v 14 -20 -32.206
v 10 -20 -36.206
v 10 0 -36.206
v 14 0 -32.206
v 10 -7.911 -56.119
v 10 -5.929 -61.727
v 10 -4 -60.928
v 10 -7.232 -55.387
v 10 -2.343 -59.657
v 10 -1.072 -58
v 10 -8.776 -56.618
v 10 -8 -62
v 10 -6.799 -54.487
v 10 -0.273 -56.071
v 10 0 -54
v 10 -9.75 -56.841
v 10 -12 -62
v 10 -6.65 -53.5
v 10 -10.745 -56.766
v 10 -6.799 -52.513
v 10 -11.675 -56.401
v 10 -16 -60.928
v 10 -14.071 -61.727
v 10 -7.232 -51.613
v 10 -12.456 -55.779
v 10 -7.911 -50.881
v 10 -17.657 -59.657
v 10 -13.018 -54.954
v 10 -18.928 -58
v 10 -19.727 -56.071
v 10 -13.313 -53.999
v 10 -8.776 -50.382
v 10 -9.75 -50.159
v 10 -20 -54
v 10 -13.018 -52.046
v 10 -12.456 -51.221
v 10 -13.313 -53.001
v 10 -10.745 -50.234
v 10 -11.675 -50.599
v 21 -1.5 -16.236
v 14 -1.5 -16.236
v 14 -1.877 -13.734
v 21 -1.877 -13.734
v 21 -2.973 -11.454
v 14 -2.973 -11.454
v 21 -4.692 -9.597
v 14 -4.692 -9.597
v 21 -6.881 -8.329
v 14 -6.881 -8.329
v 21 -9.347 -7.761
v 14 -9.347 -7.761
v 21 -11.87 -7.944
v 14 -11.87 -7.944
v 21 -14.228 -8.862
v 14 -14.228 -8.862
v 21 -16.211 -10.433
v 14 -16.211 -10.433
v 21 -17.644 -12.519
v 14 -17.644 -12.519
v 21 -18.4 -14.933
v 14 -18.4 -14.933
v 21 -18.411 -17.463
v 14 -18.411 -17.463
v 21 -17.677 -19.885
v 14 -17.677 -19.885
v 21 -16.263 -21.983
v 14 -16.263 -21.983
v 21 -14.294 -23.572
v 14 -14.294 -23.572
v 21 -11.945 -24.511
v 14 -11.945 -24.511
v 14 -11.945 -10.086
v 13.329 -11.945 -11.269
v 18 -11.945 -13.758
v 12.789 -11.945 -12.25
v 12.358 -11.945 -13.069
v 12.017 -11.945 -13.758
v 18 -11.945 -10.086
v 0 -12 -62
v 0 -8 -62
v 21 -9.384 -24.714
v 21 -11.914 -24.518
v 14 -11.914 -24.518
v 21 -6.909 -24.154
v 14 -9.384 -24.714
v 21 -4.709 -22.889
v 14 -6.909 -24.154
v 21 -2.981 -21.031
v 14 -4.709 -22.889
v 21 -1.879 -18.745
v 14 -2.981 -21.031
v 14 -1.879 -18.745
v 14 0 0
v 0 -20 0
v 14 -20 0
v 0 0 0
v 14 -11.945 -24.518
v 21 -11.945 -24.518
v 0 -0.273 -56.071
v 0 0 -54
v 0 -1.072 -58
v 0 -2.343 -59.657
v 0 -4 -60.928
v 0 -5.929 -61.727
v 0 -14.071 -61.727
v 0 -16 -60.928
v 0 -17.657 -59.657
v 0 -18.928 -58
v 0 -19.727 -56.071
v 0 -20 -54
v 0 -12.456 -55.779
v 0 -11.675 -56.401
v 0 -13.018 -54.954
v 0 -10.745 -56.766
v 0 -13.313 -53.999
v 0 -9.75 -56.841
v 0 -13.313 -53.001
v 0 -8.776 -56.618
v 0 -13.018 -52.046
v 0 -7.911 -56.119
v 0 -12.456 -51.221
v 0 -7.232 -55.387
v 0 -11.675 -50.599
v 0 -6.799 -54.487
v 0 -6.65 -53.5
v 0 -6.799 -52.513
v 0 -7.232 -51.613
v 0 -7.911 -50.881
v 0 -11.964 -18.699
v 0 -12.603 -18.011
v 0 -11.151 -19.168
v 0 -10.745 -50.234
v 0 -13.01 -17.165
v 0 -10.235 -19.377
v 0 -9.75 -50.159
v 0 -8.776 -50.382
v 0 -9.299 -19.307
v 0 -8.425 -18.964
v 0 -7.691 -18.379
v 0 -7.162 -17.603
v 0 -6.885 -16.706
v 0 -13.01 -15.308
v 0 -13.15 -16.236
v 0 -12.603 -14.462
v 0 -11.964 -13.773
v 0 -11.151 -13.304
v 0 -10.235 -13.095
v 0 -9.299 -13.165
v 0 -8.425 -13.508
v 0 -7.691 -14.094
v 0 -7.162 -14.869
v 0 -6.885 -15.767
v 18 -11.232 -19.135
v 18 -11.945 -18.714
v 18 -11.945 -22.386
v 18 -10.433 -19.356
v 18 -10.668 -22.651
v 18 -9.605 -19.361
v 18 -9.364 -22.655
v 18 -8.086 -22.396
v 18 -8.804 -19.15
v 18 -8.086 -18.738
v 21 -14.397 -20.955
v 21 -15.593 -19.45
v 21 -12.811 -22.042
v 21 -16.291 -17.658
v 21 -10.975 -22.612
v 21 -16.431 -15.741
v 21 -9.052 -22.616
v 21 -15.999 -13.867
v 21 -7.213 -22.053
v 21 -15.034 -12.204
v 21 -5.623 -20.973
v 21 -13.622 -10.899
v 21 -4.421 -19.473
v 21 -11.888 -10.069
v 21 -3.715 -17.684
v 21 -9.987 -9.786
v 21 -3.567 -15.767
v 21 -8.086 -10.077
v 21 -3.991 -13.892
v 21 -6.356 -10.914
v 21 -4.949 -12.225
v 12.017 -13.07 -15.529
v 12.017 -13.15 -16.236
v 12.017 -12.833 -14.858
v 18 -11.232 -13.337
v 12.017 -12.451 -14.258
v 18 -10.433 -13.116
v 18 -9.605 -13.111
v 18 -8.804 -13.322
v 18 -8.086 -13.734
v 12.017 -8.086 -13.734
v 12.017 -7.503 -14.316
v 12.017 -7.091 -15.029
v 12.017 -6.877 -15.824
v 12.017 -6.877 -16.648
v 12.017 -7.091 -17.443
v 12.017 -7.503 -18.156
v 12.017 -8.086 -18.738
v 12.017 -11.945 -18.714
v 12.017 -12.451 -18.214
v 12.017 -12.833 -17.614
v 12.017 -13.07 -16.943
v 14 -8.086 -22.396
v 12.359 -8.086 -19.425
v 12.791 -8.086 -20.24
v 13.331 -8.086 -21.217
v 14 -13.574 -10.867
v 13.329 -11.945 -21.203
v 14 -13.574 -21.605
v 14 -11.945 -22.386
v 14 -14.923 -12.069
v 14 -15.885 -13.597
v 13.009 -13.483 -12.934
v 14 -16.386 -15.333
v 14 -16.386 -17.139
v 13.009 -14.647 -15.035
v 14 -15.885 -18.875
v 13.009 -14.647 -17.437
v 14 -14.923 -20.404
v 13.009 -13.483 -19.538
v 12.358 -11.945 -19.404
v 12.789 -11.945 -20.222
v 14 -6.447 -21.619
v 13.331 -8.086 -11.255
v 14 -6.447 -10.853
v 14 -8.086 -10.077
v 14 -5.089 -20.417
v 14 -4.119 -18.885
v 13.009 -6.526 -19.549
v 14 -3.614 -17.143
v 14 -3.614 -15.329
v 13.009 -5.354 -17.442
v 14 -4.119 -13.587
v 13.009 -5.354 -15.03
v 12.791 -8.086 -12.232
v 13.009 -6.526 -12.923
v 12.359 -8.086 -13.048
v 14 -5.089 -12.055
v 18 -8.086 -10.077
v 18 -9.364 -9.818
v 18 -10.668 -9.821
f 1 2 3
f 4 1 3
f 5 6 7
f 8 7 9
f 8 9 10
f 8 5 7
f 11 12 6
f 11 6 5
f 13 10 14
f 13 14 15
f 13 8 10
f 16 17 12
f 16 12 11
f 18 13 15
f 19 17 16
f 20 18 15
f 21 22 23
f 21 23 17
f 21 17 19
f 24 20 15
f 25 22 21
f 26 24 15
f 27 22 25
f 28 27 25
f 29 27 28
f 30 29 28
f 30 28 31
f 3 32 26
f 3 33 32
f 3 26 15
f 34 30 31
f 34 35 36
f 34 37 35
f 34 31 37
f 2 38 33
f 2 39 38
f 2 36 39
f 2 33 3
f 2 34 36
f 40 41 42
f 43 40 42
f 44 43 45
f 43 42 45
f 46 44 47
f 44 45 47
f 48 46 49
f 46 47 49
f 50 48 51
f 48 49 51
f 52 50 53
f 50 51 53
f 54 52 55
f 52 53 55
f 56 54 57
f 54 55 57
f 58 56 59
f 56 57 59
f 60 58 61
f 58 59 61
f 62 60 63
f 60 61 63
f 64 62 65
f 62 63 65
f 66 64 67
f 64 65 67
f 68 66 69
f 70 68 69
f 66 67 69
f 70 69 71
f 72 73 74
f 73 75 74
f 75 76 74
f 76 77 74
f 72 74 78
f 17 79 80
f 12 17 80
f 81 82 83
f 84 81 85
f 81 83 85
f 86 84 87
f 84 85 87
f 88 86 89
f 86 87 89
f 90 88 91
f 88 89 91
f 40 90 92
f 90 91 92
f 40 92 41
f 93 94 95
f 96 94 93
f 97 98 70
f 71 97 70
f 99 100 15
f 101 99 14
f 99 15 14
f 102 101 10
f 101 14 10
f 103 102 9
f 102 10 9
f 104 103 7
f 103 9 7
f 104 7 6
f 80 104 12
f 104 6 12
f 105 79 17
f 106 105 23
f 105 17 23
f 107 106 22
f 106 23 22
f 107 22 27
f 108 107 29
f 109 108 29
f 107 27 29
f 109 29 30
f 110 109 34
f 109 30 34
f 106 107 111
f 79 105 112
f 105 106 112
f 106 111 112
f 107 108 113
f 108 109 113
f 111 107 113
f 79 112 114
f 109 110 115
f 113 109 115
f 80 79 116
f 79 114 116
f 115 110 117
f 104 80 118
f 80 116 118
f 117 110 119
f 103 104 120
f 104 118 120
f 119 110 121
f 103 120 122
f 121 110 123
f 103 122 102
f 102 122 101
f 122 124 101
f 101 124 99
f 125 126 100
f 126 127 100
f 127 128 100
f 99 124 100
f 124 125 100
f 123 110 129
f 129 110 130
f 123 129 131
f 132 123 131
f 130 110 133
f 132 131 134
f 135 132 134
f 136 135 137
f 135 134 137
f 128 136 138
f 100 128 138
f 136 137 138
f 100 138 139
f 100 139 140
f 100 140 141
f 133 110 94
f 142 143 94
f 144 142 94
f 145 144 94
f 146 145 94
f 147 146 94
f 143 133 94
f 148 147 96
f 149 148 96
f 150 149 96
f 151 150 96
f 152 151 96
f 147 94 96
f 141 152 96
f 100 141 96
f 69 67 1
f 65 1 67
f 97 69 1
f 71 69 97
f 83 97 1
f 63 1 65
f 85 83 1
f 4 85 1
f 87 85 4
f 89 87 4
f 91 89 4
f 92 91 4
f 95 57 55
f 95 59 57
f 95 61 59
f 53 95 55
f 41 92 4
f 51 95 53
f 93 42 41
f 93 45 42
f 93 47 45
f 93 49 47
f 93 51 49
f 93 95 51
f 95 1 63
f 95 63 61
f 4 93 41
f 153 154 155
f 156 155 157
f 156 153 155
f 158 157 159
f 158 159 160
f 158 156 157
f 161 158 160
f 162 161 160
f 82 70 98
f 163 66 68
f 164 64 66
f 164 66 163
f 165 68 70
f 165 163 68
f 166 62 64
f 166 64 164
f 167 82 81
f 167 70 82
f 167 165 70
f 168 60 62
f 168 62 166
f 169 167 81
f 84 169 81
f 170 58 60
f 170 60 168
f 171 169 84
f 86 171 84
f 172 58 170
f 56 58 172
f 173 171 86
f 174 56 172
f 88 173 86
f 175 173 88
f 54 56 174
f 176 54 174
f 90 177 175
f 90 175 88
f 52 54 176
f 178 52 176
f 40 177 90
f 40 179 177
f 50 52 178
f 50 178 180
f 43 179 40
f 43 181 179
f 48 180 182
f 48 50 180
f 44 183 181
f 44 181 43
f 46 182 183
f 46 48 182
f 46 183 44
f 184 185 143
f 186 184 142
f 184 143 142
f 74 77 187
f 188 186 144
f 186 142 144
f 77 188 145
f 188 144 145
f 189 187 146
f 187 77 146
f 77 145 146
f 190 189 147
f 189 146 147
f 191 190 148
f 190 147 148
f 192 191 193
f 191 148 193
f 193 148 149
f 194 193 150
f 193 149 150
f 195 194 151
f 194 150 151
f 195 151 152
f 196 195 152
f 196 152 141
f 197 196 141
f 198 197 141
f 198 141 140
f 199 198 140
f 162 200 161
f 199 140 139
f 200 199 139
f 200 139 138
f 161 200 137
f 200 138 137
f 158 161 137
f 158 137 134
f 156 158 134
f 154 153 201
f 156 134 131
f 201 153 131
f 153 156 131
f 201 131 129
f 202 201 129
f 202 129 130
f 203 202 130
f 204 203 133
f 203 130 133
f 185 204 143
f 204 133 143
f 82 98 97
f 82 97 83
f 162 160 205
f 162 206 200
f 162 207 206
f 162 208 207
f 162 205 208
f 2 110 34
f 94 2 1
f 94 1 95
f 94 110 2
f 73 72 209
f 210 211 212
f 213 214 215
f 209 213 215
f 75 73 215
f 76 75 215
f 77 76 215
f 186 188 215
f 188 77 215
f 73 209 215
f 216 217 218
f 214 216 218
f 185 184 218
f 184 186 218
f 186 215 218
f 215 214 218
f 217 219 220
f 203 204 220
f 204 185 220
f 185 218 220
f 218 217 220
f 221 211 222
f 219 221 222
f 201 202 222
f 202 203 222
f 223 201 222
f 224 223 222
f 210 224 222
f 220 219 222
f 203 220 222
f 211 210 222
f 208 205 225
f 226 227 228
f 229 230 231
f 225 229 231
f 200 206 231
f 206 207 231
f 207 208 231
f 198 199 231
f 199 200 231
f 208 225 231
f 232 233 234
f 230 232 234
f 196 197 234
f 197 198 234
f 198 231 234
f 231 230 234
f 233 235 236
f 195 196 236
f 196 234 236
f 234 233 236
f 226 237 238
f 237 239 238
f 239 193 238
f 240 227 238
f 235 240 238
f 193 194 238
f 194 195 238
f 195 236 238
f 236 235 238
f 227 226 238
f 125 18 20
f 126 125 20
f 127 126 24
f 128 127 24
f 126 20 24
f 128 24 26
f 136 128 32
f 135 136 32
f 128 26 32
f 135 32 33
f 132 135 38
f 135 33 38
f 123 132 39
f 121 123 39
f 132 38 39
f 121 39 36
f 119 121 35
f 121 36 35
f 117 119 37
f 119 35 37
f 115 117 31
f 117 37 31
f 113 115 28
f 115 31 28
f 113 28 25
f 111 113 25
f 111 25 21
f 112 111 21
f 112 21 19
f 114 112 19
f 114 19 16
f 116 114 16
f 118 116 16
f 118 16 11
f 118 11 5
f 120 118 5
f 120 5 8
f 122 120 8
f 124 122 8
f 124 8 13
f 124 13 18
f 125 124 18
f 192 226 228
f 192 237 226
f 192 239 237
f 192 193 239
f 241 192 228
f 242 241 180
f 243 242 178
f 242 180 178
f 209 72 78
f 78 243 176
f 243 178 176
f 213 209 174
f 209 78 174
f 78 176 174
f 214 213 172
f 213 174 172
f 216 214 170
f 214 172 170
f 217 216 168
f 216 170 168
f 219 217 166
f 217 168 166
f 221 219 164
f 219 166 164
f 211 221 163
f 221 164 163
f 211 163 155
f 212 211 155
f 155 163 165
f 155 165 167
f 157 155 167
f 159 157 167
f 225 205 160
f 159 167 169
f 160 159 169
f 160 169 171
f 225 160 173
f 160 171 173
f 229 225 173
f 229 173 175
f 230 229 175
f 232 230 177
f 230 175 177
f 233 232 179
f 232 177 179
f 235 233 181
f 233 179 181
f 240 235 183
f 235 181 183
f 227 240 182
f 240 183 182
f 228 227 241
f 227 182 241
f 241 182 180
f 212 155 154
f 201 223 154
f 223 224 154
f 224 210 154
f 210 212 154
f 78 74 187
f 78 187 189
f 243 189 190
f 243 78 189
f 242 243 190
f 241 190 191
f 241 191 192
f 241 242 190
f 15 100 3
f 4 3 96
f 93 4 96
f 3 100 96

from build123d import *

# Parameters (mm, degrees)
F0_W      = 20
F0_H      = 62
F1_DEPTH  = 14
F2_R      = 8.5
F3_DEPTH  = 7
F5_D      = 12.9
F5_DEPTH  = 7
F5_TIP    = 3.8755509927
F6_W      = 3.8587664786
F6_H      = 16.5562349188
F7_DEPTH  = 11.59683
F9_D      = 6.3
F10_R     = 6.45
F11_DEPTH = 3
F12_R     = 8
F13_R     = 8
F14_W     = 4
F14_H     = 37.0940975845
F15_DEPTH = 25
F17_D     = 6.7
F18_SIZE  = 3.99999


# Not quite as in the source:
# - a fillet or chamfer is up to 0.001 mm smaller than in the source, because OpenCascade refuses the exact size


with BuildPart() as f1:
    # F0 (on Right) → F1 (new body)
    with BuildSketch(Plane.YZ):
        with Locations((-10, -31)):
            Rectangle(F0_W, F0_H)
    extrude(amount=F1_DEPTH)

    # F2 (on face) → F3 (join)
    with BuildSketch(Plane.YZ.offset(14)):
        with Locations((-10, -16.2361655384)):
            Circle(F2_R)
    extrude(amount=F3_DEPTH)

    # F5
    with Locations(Plane.YZ.offset(21)):
        with Locations((-10, -16.2361655384)):
            Hole(F5_D / 2, depth=F5_DEPTH)
            with Locations((0, 0, -(F5_DEPTH + F5_TIP / 2))):  # 118° drill point
                Cone(0, F5_D / 2, F5_TIP, mode=Mode.SUBTRACT)

    # F6 (on face) → F7 (join)
    with BuildSketch(Plane.YZ.offset(21)):
        with Locations((-10.015449224, -16.2397662935)):
            Rectangle(F6_W, F6_H)
    extrude(amount=-F7_DEPTH)

    # F9 (through all)
    with Locations(Plane.YZ.offset(21)):
        with Locations((-10, -16.2361655384)):
            Hole(F9_D / 2)

    # F10 (on face) → F11 (cut)
    with BuildSketch(Plane.YZ.offset(21)):
        with Locations((-10, -16.2361655384)):
            Circle(F10_R)
    extrude(amount=-F11_DEPTH, mode=Mode.SUBTRACT)

    # F12
    f12_edges = [f1.edges().sort_by_distance(p)[0] for p in [
        (7, 0, -62),
    ]]
    fillet(f12_edges, radius=F12_R)

    # F13
    f13_edges = [f1.edges().sort_by_distance(p)[0] for p in [
        (7, -20, -62),
    ]]
    fillet(f13_edges, radius=F13_R)

    # F14 (on face) → F15 (cut)
    with BuildSketch(Plane.XZ.offset(20)):
        with Locations((12, -50.7526341826)):
            Rectangle(F14_W, F14_H)
    extrude(amount=-F15_DEPTH, mode=Mode.SUBTRACT)

    # F17 (through all)
    with Locations(Plane(origin=(0, 0, 0), x_dir=(0, -1, 0), z_dir=(-1, 0, 0))):
        with Locations((10, -53.5)):
            Hole(F17_D / 2)

    # F18 (size 4 in the source; OpenCascade refuses exactly that, so slightly less here)
    f18_edges = [f1.edges().sort_by_distance(p)[0] for p in [
        (10, -10, -32.205585),
    ]]
    chamfer(f18_edges, length=F18_SIZE)


solid = f1.part
